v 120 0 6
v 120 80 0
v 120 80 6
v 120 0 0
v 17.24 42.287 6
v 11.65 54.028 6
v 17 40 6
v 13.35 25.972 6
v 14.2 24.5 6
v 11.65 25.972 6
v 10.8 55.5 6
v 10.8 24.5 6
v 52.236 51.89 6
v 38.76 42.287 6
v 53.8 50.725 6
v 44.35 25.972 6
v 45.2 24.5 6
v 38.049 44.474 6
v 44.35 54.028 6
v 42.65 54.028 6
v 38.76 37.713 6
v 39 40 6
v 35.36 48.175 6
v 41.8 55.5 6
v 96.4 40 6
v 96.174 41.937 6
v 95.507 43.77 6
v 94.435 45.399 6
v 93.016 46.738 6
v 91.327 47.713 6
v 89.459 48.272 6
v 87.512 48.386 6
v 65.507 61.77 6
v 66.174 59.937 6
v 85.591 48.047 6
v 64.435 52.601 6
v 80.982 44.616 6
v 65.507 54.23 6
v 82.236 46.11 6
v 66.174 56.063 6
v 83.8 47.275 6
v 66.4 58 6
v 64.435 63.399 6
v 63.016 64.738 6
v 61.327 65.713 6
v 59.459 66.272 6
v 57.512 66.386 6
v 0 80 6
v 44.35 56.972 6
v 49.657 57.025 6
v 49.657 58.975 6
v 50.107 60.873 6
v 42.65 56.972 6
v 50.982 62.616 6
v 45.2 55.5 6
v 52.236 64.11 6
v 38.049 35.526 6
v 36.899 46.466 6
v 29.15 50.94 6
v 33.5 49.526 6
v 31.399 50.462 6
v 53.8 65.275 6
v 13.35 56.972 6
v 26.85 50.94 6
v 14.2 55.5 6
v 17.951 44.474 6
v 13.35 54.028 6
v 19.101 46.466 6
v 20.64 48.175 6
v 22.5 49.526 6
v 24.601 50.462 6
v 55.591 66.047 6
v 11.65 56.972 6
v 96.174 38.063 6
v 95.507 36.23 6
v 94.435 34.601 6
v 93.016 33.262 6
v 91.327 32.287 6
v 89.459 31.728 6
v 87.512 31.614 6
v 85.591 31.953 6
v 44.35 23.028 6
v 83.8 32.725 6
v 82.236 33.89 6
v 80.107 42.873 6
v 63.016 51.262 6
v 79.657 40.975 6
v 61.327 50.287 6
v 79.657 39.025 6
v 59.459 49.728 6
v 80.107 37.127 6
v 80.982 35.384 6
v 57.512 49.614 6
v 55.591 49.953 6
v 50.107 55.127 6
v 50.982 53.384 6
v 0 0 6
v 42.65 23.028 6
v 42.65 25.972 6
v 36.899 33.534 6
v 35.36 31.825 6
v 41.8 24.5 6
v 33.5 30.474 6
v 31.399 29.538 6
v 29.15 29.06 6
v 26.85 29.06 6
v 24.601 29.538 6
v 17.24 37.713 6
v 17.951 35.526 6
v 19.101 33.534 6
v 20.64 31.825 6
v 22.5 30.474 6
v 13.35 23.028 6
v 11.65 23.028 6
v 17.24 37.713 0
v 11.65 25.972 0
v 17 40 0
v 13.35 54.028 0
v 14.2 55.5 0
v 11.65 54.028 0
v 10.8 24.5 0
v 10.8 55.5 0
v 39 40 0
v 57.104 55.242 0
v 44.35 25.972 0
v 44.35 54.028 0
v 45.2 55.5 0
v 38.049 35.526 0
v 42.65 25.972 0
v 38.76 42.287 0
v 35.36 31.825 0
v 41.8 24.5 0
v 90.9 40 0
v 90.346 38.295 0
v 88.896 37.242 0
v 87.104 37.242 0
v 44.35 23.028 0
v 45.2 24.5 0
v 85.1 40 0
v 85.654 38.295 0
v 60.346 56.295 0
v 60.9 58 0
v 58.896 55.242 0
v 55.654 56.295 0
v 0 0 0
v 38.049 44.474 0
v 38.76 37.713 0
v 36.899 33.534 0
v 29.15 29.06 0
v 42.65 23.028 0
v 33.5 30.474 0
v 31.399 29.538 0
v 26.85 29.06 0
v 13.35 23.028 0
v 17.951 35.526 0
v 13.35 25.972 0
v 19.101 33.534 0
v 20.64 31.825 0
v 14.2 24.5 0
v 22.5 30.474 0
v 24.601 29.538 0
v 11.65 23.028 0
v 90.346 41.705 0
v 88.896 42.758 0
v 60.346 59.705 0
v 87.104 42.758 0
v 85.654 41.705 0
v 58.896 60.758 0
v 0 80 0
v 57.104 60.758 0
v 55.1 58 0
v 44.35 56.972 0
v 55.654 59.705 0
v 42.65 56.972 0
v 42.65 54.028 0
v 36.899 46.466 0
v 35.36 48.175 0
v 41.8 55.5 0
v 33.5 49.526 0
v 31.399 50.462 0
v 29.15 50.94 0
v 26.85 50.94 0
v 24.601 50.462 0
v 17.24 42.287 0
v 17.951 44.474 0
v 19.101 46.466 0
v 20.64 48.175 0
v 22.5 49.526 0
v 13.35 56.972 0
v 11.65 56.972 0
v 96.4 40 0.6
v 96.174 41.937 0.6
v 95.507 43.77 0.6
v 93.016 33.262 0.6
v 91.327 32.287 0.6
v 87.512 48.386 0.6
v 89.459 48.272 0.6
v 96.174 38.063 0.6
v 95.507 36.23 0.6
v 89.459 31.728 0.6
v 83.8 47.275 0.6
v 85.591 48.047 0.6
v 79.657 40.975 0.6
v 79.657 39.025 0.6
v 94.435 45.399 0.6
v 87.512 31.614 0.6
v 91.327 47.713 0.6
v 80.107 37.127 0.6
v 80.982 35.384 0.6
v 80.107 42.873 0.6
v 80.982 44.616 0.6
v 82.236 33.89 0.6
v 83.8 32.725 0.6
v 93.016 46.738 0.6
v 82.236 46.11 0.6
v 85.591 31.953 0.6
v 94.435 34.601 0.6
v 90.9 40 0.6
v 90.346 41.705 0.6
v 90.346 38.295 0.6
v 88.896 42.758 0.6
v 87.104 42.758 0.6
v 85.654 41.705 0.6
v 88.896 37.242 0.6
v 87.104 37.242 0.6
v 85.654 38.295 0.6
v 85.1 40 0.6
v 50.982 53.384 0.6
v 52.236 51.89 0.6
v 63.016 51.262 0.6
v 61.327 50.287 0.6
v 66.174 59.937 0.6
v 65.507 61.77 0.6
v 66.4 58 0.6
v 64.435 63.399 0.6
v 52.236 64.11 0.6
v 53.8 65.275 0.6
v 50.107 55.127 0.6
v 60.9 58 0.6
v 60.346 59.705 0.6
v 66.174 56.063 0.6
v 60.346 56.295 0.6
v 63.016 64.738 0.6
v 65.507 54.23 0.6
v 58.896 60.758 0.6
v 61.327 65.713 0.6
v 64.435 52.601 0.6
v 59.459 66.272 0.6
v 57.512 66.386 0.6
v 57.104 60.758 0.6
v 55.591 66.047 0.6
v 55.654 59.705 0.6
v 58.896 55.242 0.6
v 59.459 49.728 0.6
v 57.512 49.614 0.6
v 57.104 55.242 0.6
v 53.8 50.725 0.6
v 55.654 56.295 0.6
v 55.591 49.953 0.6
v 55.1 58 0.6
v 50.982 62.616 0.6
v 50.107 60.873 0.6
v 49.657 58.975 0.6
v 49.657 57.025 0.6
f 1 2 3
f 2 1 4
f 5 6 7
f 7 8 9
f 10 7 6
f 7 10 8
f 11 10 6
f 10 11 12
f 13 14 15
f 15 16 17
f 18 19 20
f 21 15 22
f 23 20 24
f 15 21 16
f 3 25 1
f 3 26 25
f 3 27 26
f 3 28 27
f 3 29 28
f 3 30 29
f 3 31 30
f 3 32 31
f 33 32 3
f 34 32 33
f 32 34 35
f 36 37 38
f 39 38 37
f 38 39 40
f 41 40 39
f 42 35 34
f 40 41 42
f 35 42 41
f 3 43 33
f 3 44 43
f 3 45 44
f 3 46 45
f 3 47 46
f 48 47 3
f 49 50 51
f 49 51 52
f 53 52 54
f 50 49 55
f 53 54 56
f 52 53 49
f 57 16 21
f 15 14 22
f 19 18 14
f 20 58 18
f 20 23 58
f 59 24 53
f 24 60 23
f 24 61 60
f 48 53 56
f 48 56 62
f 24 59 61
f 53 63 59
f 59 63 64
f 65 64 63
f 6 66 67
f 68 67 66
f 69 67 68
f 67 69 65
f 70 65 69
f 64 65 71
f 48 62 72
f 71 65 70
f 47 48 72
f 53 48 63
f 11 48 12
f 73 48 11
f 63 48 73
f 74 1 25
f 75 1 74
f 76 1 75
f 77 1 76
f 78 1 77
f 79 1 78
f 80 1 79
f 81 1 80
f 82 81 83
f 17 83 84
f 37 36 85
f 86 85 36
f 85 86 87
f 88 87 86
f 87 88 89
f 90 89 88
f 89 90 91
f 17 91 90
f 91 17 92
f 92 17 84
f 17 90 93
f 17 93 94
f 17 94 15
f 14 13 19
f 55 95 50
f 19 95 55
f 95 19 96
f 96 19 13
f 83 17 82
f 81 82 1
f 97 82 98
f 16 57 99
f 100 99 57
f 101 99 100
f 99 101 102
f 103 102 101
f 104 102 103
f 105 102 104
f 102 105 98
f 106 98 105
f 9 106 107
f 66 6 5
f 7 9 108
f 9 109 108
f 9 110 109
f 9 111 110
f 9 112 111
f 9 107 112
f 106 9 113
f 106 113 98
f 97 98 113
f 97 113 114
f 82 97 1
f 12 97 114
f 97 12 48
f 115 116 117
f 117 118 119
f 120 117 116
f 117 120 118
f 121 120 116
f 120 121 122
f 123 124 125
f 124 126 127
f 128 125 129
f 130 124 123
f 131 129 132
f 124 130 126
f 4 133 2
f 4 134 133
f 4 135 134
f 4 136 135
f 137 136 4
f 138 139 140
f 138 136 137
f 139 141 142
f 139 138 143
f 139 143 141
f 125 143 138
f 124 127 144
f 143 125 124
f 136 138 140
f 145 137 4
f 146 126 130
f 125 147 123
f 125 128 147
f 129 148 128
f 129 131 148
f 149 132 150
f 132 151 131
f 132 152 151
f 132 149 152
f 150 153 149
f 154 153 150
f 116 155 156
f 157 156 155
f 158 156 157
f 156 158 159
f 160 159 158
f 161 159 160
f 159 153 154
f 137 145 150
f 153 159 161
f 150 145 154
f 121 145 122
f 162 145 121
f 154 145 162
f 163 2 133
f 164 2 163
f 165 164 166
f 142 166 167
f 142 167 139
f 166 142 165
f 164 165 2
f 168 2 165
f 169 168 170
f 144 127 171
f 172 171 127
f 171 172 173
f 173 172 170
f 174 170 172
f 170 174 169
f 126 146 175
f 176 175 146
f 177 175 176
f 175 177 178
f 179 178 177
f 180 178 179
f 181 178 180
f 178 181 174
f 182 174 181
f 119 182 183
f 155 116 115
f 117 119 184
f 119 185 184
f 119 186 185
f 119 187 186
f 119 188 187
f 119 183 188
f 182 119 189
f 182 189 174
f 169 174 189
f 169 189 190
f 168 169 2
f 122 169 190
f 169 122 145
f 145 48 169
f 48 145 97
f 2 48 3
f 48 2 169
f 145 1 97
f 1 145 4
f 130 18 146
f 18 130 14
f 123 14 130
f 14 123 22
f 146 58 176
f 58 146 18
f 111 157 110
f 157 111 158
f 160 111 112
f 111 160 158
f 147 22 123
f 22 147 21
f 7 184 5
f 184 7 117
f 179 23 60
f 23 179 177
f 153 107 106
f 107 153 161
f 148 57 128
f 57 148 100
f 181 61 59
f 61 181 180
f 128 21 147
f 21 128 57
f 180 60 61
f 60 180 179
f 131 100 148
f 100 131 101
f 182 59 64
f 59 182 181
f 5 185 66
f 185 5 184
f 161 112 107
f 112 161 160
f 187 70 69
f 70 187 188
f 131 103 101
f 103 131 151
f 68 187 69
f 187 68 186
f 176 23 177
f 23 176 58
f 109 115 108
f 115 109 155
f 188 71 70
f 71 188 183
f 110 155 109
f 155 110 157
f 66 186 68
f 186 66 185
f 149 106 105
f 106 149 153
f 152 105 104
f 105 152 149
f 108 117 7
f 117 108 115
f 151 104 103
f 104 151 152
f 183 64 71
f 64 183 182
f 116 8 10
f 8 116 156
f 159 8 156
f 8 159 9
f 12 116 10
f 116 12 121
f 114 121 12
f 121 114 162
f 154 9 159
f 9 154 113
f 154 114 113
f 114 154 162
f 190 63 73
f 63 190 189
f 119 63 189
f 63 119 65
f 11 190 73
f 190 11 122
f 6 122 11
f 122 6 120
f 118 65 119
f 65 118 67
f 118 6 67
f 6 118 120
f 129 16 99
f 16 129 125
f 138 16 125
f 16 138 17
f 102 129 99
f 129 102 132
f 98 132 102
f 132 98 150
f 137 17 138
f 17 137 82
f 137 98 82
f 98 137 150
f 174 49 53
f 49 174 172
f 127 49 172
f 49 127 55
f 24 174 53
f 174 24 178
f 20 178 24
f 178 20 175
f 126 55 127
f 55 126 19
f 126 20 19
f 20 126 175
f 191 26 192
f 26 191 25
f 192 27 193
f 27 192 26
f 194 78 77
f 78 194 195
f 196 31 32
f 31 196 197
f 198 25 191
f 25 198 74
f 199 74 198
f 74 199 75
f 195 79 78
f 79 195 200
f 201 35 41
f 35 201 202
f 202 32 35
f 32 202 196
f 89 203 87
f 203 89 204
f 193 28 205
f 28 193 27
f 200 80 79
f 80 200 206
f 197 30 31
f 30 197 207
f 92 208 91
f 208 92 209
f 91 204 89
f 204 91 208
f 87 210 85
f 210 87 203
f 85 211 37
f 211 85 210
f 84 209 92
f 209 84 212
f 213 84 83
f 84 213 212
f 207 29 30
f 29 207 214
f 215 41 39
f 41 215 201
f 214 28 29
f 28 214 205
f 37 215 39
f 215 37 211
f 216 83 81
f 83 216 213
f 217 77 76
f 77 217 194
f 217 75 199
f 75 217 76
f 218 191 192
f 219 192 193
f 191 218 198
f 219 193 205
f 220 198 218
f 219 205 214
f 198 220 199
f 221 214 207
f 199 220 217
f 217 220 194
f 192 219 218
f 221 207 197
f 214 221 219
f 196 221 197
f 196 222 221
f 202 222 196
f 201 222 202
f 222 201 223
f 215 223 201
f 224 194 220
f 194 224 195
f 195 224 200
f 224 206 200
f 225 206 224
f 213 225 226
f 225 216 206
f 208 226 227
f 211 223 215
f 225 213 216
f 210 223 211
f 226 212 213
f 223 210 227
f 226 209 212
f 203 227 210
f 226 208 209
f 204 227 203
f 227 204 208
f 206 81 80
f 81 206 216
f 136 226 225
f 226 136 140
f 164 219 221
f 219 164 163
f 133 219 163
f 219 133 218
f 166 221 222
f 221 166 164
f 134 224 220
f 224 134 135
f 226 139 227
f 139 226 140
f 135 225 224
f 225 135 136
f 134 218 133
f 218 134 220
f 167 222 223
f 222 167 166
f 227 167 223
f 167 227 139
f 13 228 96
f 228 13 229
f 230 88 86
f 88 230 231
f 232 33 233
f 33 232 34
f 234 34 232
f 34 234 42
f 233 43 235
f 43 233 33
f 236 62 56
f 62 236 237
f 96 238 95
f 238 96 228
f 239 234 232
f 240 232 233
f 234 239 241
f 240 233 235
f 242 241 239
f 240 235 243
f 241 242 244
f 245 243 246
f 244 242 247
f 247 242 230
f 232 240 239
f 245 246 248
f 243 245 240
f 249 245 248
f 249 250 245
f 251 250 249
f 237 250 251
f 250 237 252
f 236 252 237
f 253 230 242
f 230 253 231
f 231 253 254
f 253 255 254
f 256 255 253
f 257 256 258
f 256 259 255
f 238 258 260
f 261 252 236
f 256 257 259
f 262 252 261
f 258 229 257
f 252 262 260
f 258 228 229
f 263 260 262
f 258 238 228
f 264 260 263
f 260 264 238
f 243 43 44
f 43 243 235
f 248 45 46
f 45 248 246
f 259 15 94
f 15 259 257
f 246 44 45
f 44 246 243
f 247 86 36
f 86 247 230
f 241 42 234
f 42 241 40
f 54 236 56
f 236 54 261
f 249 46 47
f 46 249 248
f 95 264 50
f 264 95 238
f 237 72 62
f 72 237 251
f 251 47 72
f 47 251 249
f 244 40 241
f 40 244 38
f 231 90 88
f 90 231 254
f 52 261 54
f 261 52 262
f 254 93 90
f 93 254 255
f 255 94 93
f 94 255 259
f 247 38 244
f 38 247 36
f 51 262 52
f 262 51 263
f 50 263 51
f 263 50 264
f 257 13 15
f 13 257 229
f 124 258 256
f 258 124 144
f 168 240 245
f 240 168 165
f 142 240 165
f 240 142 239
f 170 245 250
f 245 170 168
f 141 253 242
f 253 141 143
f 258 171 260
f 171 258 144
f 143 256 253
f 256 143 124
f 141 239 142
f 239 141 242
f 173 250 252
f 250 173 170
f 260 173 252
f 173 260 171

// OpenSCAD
module br_reduction_plate() {
  w=120.0; h=80.0; t=6.0;
  difference() {
    cube([w, h, t], center=false);
    translate([28.0, 40.0, -1]) cylinder(h=t+2, d=22.0, center=false);
    translate([28.0 + -1*31.0/2, 40.0 + -1*31.0/2, -1]) cylinder(h=t+2, d=3.4, center=false);
    translate([28.0 + -1*31.0/2, 40.0 + 1*31.0/2, -1]) cylinder(h=t+2, d=3.4, center=false);
    translate([28.0 + 1*31.0/2, 40.0 + -1*31.0/2, -1]) cylinder(h=t+2, d=3.4, center=false);
    translate([28.0 + 1*31.0/2, 40.0 + 1*31.0/2, -1]) cylinder(h=t+2, d=3.4, center=false);
    translate([88.0, 40.0, t-(5.4)]) cylinder(h=6.4, d=16.8, center=false);
    translate([88.0, 40.0, -1]) cylinder(h=t+2, d=5.8, center=false);
    translate([58.0, 58.0, t-(5.4)]) cylinder(h=6.4, d=16.8, center=false);
    translate([58.0, 58.0, -1]) cylinder(h=t+2, d=5.8, center=false);
  }
}
br_reduction_plate();
